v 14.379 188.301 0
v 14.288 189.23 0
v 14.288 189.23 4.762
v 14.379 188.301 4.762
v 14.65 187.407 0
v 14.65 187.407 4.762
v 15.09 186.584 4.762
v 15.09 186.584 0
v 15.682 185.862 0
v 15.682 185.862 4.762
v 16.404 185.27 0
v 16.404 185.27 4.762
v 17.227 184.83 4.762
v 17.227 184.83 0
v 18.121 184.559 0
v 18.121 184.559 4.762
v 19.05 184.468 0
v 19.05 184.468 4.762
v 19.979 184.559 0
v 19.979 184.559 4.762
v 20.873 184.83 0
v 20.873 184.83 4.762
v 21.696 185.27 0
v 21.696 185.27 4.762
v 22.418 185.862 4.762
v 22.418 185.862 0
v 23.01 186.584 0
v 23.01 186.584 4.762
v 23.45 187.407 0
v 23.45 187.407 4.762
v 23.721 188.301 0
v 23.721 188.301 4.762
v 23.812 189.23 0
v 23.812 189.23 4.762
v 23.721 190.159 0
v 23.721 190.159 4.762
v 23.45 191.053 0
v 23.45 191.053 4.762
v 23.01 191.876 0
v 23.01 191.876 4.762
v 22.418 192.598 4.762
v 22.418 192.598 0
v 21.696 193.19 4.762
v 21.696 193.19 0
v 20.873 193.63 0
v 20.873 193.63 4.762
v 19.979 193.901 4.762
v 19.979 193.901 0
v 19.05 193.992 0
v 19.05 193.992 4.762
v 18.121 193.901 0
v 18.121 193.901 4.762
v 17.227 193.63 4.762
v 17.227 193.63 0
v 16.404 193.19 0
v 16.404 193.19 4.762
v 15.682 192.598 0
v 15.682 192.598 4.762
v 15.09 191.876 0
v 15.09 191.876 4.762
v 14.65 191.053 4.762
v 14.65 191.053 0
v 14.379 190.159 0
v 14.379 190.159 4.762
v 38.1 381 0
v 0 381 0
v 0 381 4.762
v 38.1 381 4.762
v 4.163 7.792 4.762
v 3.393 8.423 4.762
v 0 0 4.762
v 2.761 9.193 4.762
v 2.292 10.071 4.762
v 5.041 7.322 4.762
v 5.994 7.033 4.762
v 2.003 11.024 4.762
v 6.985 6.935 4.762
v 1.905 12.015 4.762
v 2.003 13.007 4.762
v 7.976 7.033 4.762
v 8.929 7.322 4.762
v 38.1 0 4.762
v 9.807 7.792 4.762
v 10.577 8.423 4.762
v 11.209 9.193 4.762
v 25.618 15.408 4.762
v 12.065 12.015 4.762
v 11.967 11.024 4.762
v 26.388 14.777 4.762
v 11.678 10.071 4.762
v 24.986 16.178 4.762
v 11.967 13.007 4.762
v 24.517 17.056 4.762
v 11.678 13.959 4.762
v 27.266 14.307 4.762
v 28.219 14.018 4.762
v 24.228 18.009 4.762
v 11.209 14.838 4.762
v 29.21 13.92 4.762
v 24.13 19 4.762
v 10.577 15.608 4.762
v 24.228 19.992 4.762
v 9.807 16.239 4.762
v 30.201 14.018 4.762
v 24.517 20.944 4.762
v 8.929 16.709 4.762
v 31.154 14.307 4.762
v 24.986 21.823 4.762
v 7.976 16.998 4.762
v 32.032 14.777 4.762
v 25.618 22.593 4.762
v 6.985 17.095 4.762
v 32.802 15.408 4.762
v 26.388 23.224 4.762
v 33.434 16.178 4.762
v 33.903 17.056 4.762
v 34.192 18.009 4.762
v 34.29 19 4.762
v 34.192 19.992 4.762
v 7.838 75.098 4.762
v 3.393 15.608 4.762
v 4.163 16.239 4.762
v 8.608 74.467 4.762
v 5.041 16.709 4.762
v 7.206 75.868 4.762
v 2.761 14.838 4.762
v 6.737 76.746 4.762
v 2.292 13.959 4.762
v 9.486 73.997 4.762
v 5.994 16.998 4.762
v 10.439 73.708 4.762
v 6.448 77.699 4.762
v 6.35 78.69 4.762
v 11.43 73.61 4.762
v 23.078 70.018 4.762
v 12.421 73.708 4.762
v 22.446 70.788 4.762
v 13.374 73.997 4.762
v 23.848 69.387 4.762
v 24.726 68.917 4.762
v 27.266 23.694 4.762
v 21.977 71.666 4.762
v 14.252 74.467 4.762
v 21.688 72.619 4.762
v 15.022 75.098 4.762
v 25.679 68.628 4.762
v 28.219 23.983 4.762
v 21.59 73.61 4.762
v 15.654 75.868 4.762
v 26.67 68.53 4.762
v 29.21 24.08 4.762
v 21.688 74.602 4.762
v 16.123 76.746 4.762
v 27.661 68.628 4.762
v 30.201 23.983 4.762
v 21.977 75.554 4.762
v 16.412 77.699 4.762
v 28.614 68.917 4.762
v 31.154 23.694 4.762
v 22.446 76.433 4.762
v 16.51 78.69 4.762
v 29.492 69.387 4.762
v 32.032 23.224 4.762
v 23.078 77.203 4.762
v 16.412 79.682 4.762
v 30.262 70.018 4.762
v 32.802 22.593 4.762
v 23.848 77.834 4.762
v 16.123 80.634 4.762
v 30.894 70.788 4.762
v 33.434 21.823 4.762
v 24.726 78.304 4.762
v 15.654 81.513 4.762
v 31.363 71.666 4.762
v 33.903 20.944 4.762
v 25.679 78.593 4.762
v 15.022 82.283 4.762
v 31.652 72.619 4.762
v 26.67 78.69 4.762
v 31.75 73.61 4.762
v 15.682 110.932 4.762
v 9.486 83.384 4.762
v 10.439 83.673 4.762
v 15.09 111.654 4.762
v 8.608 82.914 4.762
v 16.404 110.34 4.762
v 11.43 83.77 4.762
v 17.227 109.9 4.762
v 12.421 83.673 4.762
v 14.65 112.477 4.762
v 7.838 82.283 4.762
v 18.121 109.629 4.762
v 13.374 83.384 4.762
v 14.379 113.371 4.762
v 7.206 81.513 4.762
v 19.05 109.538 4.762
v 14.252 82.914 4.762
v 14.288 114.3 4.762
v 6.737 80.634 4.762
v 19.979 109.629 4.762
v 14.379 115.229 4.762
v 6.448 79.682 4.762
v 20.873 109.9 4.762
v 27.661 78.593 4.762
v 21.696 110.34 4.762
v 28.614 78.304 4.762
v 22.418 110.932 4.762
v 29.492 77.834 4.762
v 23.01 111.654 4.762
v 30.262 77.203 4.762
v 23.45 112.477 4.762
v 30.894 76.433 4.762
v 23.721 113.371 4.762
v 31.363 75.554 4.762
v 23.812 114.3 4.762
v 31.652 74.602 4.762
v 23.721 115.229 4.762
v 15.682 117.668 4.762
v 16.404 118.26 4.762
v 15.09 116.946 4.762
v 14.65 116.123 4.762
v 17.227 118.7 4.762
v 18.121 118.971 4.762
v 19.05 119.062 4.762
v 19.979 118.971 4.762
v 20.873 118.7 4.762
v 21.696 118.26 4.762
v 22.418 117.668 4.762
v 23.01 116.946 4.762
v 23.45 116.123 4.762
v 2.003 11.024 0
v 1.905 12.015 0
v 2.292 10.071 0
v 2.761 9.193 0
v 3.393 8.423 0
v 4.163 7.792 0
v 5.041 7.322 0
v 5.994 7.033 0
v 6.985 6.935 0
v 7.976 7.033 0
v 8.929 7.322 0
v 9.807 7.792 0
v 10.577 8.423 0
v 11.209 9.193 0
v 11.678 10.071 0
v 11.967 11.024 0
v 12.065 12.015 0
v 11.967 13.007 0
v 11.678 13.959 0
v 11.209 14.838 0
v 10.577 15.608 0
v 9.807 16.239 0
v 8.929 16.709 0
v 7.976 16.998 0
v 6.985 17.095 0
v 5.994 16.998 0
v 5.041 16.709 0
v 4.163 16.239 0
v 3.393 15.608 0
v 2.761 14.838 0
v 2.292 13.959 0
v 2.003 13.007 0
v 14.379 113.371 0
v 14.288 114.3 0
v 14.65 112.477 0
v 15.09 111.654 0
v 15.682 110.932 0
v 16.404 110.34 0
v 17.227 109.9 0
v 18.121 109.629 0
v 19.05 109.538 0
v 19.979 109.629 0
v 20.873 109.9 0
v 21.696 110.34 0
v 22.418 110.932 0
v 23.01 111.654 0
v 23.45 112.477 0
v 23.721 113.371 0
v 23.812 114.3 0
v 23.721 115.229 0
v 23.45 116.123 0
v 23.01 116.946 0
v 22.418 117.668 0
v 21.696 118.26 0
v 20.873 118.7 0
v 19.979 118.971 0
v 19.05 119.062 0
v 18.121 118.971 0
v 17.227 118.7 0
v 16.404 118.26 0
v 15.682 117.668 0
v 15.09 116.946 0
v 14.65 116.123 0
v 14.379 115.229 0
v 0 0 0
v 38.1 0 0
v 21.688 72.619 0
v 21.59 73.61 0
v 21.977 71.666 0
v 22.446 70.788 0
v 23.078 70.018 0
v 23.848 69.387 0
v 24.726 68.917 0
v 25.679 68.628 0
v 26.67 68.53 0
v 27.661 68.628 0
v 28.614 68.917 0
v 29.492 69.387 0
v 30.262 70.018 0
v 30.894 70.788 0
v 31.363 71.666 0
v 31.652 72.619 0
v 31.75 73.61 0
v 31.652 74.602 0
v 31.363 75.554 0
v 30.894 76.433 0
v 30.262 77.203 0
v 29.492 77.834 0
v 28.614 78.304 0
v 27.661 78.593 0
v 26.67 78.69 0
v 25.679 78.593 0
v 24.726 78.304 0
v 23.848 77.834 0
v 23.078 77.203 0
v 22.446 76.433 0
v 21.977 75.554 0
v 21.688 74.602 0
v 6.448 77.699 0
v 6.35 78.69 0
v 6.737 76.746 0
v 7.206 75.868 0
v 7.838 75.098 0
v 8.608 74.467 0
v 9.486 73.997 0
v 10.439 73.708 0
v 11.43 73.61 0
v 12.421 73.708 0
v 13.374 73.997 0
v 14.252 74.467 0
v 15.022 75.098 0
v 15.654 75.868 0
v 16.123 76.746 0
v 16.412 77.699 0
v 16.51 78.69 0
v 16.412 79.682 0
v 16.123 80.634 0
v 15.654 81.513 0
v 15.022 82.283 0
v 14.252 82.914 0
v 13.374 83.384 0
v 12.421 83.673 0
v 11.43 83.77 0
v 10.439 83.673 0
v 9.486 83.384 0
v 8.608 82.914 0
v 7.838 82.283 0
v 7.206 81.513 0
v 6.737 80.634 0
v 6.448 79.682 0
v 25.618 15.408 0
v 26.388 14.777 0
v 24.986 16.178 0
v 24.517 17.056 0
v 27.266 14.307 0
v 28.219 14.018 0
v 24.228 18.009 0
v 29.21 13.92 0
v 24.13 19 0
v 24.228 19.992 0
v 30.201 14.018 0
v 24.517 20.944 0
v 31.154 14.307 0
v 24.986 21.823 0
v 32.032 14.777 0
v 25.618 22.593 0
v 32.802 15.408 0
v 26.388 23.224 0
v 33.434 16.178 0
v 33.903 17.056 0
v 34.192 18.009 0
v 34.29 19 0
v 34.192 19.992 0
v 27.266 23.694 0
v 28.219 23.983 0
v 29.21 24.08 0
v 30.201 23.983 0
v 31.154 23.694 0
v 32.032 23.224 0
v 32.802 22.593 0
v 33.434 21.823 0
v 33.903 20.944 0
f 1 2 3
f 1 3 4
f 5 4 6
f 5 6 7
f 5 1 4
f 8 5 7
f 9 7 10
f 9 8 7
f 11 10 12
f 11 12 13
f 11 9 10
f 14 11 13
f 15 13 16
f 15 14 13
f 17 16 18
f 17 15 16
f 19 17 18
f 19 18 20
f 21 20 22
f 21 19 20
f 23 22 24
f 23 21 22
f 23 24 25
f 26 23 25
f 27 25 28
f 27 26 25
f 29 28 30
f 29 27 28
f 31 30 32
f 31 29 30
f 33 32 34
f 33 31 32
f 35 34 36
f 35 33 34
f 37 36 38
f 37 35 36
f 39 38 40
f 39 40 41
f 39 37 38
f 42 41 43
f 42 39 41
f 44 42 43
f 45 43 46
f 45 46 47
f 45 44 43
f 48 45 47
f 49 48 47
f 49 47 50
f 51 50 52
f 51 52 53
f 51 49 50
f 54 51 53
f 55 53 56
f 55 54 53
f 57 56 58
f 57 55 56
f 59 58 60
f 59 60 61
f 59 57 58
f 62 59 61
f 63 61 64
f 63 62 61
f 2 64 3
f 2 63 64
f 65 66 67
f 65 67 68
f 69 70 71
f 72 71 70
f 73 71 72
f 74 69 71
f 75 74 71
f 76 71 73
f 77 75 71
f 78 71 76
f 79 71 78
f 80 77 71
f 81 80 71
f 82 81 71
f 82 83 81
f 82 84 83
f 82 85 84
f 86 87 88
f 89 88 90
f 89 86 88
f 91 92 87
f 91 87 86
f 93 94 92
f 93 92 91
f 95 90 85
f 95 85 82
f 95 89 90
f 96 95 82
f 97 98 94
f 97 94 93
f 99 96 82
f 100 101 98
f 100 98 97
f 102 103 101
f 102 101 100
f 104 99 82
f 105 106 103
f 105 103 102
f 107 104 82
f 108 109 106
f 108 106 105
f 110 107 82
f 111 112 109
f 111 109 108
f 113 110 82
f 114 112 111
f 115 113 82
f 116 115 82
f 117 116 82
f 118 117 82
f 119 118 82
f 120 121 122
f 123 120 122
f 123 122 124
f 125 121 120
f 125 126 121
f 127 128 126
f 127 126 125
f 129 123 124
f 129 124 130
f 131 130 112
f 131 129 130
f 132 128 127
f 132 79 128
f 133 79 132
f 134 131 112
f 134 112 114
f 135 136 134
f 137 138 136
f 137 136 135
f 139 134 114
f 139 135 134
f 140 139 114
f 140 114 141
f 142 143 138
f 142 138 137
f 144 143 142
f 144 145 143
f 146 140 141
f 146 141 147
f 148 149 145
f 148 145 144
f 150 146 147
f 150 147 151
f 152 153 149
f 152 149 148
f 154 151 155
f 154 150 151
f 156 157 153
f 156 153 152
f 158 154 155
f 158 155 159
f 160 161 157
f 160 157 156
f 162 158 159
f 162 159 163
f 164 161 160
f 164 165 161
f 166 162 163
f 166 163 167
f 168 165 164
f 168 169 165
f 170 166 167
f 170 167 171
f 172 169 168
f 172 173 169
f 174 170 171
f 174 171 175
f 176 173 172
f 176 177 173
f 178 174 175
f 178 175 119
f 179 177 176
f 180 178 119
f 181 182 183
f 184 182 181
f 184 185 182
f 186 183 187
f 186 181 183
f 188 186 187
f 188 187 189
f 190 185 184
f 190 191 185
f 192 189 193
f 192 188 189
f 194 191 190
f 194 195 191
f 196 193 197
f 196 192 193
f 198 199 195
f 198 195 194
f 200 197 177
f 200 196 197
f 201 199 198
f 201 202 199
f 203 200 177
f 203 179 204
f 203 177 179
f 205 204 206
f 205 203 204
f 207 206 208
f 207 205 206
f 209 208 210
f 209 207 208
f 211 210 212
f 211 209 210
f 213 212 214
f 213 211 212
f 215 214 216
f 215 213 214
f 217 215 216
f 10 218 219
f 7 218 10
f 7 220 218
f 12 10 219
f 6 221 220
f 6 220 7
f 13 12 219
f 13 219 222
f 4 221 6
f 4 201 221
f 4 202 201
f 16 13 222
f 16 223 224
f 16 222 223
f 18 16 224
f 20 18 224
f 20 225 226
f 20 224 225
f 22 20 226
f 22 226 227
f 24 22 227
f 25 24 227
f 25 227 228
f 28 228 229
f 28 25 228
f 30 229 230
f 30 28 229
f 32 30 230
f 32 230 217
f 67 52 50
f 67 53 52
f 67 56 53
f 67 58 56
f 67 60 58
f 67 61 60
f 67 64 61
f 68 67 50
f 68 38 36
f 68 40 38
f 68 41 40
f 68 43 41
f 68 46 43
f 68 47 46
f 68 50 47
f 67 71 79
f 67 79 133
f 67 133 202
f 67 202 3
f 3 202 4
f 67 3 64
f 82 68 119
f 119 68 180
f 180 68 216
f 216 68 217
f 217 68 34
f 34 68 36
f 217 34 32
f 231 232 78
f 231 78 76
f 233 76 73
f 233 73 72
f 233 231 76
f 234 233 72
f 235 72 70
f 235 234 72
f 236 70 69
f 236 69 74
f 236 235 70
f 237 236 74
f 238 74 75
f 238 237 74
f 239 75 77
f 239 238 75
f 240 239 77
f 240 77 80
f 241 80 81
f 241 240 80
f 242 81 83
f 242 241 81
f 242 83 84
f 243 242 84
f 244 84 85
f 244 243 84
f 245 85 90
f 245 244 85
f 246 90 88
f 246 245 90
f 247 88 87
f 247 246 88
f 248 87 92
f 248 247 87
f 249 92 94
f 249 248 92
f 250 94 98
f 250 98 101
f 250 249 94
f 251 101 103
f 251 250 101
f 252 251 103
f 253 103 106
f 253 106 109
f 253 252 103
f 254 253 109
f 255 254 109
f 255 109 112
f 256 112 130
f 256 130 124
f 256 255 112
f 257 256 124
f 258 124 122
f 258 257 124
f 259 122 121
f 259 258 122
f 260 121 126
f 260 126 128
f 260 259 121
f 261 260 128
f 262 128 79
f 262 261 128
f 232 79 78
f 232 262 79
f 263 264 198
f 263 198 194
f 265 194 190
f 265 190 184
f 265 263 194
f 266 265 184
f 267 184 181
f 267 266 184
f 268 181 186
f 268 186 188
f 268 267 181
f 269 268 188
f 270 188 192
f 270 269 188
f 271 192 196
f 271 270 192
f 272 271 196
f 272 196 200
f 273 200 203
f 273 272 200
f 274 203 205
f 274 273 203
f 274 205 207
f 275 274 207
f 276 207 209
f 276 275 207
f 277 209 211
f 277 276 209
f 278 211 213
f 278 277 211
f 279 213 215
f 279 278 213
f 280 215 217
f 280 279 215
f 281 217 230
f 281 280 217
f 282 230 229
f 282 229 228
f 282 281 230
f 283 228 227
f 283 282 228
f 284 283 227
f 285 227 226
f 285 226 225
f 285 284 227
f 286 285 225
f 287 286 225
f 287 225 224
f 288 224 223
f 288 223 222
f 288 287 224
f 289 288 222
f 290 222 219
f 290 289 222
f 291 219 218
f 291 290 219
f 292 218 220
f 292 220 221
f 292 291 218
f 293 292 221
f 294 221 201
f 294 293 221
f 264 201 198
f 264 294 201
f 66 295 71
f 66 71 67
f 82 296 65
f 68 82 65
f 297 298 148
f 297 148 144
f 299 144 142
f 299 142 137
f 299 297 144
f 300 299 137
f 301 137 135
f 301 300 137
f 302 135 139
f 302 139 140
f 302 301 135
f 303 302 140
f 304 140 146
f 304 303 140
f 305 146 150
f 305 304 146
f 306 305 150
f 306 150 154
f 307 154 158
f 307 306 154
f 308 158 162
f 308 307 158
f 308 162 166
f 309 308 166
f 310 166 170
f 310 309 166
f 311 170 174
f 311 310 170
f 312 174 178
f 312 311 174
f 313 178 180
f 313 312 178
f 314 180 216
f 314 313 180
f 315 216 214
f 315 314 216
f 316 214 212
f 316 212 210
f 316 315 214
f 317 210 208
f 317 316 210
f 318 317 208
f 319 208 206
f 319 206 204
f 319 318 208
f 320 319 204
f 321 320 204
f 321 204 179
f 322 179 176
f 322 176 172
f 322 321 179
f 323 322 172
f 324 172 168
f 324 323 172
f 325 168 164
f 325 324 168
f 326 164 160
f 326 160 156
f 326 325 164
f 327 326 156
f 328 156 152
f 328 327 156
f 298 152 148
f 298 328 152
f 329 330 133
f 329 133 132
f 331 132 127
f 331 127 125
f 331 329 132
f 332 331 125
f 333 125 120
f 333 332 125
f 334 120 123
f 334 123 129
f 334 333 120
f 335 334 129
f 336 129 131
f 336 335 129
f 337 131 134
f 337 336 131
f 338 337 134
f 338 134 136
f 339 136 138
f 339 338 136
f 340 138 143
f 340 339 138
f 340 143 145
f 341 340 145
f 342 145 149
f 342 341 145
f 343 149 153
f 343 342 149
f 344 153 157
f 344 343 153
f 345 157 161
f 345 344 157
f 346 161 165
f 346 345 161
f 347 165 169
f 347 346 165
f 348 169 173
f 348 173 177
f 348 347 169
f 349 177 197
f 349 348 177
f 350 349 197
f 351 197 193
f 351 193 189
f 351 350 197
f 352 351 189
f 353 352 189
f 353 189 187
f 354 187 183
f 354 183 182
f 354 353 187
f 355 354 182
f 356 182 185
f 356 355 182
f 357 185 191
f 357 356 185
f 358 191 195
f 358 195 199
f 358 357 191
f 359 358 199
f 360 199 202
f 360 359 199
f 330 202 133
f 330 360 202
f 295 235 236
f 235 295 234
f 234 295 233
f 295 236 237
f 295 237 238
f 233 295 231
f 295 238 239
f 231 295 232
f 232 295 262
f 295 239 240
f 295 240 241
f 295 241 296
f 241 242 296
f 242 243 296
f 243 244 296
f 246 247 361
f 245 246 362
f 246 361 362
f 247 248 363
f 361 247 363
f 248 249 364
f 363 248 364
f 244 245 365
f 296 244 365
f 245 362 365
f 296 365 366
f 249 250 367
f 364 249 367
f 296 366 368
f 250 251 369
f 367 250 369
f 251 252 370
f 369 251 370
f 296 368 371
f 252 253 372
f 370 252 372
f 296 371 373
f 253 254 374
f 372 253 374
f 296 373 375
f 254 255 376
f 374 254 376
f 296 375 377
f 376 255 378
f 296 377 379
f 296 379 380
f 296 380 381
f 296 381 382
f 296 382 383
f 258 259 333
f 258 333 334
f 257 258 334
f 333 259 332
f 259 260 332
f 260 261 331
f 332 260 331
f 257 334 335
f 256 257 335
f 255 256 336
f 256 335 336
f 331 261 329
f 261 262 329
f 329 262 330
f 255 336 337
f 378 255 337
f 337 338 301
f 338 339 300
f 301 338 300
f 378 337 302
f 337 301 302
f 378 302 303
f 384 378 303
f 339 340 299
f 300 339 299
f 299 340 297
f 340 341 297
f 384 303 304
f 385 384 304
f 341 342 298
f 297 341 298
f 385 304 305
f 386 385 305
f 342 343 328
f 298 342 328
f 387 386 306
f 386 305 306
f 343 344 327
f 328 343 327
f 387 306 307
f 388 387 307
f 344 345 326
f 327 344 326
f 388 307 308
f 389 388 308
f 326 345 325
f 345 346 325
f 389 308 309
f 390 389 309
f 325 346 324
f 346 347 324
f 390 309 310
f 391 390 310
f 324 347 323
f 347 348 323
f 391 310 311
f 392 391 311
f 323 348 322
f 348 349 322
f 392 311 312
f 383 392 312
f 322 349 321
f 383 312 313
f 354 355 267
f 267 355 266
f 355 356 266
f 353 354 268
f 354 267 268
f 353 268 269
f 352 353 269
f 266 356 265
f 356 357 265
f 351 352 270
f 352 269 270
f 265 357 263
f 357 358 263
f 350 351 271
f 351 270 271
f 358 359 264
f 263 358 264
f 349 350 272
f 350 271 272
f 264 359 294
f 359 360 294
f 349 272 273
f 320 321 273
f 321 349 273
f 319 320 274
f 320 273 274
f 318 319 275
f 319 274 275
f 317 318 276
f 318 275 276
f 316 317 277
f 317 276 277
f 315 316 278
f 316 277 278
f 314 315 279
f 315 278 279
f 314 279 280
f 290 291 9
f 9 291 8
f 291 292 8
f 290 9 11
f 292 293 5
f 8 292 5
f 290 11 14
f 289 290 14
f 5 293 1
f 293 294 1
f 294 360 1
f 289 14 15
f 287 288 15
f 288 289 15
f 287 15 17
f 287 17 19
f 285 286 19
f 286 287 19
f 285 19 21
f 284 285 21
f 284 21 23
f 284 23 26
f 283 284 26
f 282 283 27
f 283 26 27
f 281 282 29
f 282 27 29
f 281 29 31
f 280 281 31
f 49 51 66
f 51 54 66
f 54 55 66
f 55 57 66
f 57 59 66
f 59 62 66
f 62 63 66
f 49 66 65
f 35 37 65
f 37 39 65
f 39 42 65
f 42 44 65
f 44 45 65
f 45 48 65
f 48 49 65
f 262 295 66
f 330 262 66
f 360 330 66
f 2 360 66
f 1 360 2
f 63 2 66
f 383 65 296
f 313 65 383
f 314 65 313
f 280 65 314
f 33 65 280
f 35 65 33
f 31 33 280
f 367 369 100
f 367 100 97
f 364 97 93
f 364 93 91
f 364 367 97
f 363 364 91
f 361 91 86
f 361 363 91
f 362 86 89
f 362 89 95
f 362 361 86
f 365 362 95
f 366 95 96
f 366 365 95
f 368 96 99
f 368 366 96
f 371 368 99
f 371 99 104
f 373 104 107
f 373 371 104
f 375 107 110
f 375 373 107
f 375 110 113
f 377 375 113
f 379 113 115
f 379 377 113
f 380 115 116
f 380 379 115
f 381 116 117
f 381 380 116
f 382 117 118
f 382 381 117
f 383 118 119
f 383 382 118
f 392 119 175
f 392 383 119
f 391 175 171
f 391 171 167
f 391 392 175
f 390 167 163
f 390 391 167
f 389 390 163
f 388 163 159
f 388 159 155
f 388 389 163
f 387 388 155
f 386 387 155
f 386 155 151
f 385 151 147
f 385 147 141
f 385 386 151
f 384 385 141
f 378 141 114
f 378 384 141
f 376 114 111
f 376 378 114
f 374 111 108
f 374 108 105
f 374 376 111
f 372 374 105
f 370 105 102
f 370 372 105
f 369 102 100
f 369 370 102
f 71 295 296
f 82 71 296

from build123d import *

# Parameters (mm, degrees)
SKETCH2_W           = 38.1
SKETCH2_H           = 381
SKETCH2_R           = 5.08
SKETCH2_R_2         = 4.7625
BOSS_EXTRUDE2_DEPTH = 4.7625


with BuildPart() as part:
    # Sketch2 → Boss-Extrude2 (new body)
    with BuildSketch(Plane.XY):
        with Locations((19.05, 190.5)):
            Rectangle(SKETCH2_W, SKETCH2_H)
        with Locations(Location((11.43, 78.69046619, 0), (0, 0, 180))):
            Circle(SKETCH2_R, mode=Mode.SUBTRACT)
        with Locations(Location((26.67, 73.61046619, 0), (0, 0, 180))):
            Circle(SKETCH2_R, mode=Mode.SUBTRACT)
        with Locations(Location((6.985, 12.01546619, 0), (0, 0, 180))):
            Circle(SKETCH2_R, mode=Mode.SUBTRACT)
        with Locations(Location((29.21, 19.00046619, 0), (0, 0, 180))):
            Circle(SKETCH2_R, mode=Mode.SUBTRACT)
        with Locations(Location((19.05, 114.3, 0), (0, 0, 180))):
            Circle(SKETCH2_R_2, mode=Mode.SUBTRACT)
        with Locations(Location((19.05, 189.23, 0), (0, 0, 180))):
            Circle(SKETCH2_R_2, mode=Mode.SUBTRACT)
    extrude(amount=BOSS_EXTRUDE2_DEPTH)


solid = part.part
